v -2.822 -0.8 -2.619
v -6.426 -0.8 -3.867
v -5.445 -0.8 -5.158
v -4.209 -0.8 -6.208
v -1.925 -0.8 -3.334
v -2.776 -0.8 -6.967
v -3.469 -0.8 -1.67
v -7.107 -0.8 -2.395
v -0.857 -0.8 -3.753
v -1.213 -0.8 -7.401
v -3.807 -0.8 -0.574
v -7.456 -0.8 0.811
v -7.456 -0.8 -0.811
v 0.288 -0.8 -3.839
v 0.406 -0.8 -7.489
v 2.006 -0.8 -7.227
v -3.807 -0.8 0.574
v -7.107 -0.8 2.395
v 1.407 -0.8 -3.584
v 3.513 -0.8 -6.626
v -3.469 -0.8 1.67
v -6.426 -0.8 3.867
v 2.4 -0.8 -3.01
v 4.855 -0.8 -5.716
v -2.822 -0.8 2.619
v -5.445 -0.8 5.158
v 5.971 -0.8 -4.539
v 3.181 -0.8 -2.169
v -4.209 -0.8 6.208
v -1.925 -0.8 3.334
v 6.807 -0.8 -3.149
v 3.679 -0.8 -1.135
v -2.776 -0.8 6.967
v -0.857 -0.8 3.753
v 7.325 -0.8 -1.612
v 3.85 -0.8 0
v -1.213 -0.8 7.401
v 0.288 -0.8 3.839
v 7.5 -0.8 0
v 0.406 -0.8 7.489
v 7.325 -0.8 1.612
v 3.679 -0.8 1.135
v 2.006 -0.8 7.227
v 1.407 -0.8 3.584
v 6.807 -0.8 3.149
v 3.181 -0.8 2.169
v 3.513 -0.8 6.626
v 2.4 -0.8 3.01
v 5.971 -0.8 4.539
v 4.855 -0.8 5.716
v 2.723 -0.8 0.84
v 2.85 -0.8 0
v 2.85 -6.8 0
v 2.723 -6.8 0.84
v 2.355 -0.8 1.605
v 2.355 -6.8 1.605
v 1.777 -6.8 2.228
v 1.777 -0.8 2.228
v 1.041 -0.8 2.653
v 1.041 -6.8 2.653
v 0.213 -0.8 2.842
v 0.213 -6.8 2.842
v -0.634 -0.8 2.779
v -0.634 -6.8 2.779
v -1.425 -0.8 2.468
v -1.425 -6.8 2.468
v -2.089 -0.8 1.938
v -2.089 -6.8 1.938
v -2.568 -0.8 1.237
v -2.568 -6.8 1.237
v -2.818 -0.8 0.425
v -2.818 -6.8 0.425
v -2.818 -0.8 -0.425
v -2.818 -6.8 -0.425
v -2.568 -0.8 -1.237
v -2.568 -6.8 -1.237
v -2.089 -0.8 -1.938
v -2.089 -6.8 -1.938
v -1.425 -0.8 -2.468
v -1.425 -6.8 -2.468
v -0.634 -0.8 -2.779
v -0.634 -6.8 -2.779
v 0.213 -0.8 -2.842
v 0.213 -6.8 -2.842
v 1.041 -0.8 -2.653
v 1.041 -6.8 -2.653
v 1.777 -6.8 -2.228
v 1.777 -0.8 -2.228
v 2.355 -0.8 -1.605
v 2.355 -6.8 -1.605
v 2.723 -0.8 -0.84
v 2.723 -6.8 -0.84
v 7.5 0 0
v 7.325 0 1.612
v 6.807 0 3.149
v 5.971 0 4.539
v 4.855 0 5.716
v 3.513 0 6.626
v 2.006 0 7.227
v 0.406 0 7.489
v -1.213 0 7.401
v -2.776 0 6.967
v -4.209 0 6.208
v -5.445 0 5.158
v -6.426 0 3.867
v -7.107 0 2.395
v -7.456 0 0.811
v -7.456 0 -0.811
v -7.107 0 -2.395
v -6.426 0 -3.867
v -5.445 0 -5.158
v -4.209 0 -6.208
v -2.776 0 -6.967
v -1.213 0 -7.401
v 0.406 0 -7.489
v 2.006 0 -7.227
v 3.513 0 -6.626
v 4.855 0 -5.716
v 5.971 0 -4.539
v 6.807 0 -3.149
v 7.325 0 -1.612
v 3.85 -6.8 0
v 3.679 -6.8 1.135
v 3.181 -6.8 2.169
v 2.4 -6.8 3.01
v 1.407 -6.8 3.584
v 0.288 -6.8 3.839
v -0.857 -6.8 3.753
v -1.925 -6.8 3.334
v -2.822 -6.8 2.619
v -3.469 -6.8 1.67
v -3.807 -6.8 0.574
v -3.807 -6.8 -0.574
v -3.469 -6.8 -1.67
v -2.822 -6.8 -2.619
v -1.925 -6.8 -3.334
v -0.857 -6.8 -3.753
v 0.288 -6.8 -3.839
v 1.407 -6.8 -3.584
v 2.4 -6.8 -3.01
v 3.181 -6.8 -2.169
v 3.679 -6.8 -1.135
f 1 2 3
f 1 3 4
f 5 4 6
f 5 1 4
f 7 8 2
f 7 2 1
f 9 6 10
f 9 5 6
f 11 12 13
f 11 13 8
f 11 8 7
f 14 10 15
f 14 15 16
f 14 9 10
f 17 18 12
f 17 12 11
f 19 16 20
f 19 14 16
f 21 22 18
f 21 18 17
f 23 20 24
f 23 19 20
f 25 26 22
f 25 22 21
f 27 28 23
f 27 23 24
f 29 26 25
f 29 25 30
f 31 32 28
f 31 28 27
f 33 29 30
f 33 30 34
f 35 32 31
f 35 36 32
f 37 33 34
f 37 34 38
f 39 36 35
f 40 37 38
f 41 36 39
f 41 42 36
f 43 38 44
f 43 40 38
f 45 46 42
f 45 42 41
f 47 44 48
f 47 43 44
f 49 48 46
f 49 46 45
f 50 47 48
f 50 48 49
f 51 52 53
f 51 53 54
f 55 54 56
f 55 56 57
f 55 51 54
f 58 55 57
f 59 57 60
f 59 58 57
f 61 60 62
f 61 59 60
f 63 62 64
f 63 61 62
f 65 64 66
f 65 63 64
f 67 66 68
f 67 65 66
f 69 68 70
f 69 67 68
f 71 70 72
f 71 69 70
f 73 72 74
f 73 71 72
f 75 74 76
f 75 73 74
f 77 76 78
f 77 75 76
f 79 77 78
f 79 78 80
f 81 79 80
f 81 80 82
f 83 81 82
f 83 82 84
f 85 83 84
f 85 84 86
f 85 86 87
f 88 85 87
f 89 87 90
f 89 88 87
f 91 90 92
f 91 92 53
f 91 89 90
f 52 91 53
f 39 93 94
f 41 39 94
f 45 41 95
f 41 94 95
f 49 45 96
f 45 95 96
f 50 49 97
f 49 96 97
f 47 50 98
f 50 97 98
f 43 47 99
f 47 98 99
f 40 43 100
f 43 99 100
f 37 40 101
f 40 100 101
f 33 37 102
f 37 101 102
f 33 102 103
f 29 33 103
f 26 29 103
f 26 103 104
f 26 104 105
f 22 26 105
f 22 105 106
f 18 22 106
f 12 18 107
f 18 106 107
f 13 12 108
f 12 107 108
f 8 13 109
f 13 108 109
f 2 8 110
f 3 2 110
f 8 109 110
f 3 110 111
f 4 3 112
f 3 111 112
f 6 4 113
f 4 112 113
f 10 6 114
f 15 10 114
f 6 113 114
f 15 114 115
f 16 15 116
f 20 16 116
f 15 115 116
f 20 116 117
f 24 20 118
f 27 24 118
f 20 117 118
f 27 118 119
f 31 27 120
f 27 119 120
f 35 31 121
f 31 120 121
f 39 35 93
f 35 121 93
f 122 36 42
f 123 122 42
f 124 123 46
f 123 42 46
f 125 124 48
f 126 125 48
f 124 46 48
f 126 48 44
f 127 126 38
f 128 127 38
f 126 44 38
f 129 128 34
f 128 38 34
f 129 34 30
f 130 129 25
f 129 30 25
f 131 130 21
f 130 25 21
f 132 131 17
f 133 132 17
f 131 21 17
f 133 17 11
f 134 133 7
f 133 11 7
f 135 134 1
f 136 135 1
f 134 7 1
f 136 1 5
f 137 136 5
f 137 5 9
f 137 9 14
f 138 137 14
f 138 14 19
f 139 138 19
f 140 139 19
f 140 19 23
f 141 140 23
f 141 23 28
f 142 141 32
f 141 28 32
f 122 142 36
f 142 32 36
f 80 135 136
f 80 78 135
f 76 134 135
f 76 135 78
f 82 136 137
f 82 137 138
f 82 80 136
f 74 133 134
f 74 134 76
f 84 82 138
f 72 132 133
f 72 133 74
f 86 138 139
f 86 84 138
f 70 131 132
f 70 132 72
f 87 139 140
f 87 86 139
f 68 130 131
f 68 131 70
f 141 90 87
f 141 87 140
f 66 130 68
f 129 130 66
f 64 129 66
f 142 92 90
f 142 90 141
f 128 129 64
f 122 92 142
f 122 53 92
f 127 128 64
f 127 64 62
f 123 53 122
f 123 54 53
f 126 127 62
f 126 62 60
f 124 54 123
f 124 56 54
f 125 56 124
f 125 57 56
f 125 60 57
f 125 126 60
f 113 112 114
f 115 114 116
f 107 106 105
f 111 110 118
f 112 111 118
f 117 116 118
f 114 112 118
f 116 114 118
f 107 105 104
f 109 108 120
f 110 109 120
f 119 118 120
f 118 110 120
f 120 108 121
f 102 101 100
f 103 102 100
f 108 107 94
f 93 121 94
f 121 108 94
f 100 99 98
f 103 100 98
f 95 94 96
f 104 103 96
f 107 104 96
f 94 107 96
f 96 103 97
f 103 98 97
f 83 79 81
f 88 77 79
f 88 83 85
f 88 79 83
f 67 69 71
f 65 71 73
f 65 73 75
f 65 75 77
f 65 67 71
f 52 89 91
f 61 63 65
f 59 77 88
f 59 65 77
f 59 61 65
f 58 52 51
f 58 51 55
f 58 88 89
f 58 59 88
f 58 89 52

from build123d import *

# Parameters (mm, degrees)
F0_R     = 7.5
F1_DEPTH = 0.8
F3_R     = 3.85
F3_R_2   = 2.85
F4_DEPTH = 6


with BuildPart() as f1:
    # F0 (on Front) → F1 (new body)
    with BuildSketch(Plane.XZ):
        Circle(F0_R)
    extrude(amount=F1_DEPTH)

    # F3 (on face) → F4 (join)
    with BuildSketch(Plane.XZ.offset(0.8)):
        Circle(F3_R)
        Circle(F3_R_2, mode=Mode.SUBTRACT)
    extrude(amount=F4_DEPTH)


solid = f1.part
